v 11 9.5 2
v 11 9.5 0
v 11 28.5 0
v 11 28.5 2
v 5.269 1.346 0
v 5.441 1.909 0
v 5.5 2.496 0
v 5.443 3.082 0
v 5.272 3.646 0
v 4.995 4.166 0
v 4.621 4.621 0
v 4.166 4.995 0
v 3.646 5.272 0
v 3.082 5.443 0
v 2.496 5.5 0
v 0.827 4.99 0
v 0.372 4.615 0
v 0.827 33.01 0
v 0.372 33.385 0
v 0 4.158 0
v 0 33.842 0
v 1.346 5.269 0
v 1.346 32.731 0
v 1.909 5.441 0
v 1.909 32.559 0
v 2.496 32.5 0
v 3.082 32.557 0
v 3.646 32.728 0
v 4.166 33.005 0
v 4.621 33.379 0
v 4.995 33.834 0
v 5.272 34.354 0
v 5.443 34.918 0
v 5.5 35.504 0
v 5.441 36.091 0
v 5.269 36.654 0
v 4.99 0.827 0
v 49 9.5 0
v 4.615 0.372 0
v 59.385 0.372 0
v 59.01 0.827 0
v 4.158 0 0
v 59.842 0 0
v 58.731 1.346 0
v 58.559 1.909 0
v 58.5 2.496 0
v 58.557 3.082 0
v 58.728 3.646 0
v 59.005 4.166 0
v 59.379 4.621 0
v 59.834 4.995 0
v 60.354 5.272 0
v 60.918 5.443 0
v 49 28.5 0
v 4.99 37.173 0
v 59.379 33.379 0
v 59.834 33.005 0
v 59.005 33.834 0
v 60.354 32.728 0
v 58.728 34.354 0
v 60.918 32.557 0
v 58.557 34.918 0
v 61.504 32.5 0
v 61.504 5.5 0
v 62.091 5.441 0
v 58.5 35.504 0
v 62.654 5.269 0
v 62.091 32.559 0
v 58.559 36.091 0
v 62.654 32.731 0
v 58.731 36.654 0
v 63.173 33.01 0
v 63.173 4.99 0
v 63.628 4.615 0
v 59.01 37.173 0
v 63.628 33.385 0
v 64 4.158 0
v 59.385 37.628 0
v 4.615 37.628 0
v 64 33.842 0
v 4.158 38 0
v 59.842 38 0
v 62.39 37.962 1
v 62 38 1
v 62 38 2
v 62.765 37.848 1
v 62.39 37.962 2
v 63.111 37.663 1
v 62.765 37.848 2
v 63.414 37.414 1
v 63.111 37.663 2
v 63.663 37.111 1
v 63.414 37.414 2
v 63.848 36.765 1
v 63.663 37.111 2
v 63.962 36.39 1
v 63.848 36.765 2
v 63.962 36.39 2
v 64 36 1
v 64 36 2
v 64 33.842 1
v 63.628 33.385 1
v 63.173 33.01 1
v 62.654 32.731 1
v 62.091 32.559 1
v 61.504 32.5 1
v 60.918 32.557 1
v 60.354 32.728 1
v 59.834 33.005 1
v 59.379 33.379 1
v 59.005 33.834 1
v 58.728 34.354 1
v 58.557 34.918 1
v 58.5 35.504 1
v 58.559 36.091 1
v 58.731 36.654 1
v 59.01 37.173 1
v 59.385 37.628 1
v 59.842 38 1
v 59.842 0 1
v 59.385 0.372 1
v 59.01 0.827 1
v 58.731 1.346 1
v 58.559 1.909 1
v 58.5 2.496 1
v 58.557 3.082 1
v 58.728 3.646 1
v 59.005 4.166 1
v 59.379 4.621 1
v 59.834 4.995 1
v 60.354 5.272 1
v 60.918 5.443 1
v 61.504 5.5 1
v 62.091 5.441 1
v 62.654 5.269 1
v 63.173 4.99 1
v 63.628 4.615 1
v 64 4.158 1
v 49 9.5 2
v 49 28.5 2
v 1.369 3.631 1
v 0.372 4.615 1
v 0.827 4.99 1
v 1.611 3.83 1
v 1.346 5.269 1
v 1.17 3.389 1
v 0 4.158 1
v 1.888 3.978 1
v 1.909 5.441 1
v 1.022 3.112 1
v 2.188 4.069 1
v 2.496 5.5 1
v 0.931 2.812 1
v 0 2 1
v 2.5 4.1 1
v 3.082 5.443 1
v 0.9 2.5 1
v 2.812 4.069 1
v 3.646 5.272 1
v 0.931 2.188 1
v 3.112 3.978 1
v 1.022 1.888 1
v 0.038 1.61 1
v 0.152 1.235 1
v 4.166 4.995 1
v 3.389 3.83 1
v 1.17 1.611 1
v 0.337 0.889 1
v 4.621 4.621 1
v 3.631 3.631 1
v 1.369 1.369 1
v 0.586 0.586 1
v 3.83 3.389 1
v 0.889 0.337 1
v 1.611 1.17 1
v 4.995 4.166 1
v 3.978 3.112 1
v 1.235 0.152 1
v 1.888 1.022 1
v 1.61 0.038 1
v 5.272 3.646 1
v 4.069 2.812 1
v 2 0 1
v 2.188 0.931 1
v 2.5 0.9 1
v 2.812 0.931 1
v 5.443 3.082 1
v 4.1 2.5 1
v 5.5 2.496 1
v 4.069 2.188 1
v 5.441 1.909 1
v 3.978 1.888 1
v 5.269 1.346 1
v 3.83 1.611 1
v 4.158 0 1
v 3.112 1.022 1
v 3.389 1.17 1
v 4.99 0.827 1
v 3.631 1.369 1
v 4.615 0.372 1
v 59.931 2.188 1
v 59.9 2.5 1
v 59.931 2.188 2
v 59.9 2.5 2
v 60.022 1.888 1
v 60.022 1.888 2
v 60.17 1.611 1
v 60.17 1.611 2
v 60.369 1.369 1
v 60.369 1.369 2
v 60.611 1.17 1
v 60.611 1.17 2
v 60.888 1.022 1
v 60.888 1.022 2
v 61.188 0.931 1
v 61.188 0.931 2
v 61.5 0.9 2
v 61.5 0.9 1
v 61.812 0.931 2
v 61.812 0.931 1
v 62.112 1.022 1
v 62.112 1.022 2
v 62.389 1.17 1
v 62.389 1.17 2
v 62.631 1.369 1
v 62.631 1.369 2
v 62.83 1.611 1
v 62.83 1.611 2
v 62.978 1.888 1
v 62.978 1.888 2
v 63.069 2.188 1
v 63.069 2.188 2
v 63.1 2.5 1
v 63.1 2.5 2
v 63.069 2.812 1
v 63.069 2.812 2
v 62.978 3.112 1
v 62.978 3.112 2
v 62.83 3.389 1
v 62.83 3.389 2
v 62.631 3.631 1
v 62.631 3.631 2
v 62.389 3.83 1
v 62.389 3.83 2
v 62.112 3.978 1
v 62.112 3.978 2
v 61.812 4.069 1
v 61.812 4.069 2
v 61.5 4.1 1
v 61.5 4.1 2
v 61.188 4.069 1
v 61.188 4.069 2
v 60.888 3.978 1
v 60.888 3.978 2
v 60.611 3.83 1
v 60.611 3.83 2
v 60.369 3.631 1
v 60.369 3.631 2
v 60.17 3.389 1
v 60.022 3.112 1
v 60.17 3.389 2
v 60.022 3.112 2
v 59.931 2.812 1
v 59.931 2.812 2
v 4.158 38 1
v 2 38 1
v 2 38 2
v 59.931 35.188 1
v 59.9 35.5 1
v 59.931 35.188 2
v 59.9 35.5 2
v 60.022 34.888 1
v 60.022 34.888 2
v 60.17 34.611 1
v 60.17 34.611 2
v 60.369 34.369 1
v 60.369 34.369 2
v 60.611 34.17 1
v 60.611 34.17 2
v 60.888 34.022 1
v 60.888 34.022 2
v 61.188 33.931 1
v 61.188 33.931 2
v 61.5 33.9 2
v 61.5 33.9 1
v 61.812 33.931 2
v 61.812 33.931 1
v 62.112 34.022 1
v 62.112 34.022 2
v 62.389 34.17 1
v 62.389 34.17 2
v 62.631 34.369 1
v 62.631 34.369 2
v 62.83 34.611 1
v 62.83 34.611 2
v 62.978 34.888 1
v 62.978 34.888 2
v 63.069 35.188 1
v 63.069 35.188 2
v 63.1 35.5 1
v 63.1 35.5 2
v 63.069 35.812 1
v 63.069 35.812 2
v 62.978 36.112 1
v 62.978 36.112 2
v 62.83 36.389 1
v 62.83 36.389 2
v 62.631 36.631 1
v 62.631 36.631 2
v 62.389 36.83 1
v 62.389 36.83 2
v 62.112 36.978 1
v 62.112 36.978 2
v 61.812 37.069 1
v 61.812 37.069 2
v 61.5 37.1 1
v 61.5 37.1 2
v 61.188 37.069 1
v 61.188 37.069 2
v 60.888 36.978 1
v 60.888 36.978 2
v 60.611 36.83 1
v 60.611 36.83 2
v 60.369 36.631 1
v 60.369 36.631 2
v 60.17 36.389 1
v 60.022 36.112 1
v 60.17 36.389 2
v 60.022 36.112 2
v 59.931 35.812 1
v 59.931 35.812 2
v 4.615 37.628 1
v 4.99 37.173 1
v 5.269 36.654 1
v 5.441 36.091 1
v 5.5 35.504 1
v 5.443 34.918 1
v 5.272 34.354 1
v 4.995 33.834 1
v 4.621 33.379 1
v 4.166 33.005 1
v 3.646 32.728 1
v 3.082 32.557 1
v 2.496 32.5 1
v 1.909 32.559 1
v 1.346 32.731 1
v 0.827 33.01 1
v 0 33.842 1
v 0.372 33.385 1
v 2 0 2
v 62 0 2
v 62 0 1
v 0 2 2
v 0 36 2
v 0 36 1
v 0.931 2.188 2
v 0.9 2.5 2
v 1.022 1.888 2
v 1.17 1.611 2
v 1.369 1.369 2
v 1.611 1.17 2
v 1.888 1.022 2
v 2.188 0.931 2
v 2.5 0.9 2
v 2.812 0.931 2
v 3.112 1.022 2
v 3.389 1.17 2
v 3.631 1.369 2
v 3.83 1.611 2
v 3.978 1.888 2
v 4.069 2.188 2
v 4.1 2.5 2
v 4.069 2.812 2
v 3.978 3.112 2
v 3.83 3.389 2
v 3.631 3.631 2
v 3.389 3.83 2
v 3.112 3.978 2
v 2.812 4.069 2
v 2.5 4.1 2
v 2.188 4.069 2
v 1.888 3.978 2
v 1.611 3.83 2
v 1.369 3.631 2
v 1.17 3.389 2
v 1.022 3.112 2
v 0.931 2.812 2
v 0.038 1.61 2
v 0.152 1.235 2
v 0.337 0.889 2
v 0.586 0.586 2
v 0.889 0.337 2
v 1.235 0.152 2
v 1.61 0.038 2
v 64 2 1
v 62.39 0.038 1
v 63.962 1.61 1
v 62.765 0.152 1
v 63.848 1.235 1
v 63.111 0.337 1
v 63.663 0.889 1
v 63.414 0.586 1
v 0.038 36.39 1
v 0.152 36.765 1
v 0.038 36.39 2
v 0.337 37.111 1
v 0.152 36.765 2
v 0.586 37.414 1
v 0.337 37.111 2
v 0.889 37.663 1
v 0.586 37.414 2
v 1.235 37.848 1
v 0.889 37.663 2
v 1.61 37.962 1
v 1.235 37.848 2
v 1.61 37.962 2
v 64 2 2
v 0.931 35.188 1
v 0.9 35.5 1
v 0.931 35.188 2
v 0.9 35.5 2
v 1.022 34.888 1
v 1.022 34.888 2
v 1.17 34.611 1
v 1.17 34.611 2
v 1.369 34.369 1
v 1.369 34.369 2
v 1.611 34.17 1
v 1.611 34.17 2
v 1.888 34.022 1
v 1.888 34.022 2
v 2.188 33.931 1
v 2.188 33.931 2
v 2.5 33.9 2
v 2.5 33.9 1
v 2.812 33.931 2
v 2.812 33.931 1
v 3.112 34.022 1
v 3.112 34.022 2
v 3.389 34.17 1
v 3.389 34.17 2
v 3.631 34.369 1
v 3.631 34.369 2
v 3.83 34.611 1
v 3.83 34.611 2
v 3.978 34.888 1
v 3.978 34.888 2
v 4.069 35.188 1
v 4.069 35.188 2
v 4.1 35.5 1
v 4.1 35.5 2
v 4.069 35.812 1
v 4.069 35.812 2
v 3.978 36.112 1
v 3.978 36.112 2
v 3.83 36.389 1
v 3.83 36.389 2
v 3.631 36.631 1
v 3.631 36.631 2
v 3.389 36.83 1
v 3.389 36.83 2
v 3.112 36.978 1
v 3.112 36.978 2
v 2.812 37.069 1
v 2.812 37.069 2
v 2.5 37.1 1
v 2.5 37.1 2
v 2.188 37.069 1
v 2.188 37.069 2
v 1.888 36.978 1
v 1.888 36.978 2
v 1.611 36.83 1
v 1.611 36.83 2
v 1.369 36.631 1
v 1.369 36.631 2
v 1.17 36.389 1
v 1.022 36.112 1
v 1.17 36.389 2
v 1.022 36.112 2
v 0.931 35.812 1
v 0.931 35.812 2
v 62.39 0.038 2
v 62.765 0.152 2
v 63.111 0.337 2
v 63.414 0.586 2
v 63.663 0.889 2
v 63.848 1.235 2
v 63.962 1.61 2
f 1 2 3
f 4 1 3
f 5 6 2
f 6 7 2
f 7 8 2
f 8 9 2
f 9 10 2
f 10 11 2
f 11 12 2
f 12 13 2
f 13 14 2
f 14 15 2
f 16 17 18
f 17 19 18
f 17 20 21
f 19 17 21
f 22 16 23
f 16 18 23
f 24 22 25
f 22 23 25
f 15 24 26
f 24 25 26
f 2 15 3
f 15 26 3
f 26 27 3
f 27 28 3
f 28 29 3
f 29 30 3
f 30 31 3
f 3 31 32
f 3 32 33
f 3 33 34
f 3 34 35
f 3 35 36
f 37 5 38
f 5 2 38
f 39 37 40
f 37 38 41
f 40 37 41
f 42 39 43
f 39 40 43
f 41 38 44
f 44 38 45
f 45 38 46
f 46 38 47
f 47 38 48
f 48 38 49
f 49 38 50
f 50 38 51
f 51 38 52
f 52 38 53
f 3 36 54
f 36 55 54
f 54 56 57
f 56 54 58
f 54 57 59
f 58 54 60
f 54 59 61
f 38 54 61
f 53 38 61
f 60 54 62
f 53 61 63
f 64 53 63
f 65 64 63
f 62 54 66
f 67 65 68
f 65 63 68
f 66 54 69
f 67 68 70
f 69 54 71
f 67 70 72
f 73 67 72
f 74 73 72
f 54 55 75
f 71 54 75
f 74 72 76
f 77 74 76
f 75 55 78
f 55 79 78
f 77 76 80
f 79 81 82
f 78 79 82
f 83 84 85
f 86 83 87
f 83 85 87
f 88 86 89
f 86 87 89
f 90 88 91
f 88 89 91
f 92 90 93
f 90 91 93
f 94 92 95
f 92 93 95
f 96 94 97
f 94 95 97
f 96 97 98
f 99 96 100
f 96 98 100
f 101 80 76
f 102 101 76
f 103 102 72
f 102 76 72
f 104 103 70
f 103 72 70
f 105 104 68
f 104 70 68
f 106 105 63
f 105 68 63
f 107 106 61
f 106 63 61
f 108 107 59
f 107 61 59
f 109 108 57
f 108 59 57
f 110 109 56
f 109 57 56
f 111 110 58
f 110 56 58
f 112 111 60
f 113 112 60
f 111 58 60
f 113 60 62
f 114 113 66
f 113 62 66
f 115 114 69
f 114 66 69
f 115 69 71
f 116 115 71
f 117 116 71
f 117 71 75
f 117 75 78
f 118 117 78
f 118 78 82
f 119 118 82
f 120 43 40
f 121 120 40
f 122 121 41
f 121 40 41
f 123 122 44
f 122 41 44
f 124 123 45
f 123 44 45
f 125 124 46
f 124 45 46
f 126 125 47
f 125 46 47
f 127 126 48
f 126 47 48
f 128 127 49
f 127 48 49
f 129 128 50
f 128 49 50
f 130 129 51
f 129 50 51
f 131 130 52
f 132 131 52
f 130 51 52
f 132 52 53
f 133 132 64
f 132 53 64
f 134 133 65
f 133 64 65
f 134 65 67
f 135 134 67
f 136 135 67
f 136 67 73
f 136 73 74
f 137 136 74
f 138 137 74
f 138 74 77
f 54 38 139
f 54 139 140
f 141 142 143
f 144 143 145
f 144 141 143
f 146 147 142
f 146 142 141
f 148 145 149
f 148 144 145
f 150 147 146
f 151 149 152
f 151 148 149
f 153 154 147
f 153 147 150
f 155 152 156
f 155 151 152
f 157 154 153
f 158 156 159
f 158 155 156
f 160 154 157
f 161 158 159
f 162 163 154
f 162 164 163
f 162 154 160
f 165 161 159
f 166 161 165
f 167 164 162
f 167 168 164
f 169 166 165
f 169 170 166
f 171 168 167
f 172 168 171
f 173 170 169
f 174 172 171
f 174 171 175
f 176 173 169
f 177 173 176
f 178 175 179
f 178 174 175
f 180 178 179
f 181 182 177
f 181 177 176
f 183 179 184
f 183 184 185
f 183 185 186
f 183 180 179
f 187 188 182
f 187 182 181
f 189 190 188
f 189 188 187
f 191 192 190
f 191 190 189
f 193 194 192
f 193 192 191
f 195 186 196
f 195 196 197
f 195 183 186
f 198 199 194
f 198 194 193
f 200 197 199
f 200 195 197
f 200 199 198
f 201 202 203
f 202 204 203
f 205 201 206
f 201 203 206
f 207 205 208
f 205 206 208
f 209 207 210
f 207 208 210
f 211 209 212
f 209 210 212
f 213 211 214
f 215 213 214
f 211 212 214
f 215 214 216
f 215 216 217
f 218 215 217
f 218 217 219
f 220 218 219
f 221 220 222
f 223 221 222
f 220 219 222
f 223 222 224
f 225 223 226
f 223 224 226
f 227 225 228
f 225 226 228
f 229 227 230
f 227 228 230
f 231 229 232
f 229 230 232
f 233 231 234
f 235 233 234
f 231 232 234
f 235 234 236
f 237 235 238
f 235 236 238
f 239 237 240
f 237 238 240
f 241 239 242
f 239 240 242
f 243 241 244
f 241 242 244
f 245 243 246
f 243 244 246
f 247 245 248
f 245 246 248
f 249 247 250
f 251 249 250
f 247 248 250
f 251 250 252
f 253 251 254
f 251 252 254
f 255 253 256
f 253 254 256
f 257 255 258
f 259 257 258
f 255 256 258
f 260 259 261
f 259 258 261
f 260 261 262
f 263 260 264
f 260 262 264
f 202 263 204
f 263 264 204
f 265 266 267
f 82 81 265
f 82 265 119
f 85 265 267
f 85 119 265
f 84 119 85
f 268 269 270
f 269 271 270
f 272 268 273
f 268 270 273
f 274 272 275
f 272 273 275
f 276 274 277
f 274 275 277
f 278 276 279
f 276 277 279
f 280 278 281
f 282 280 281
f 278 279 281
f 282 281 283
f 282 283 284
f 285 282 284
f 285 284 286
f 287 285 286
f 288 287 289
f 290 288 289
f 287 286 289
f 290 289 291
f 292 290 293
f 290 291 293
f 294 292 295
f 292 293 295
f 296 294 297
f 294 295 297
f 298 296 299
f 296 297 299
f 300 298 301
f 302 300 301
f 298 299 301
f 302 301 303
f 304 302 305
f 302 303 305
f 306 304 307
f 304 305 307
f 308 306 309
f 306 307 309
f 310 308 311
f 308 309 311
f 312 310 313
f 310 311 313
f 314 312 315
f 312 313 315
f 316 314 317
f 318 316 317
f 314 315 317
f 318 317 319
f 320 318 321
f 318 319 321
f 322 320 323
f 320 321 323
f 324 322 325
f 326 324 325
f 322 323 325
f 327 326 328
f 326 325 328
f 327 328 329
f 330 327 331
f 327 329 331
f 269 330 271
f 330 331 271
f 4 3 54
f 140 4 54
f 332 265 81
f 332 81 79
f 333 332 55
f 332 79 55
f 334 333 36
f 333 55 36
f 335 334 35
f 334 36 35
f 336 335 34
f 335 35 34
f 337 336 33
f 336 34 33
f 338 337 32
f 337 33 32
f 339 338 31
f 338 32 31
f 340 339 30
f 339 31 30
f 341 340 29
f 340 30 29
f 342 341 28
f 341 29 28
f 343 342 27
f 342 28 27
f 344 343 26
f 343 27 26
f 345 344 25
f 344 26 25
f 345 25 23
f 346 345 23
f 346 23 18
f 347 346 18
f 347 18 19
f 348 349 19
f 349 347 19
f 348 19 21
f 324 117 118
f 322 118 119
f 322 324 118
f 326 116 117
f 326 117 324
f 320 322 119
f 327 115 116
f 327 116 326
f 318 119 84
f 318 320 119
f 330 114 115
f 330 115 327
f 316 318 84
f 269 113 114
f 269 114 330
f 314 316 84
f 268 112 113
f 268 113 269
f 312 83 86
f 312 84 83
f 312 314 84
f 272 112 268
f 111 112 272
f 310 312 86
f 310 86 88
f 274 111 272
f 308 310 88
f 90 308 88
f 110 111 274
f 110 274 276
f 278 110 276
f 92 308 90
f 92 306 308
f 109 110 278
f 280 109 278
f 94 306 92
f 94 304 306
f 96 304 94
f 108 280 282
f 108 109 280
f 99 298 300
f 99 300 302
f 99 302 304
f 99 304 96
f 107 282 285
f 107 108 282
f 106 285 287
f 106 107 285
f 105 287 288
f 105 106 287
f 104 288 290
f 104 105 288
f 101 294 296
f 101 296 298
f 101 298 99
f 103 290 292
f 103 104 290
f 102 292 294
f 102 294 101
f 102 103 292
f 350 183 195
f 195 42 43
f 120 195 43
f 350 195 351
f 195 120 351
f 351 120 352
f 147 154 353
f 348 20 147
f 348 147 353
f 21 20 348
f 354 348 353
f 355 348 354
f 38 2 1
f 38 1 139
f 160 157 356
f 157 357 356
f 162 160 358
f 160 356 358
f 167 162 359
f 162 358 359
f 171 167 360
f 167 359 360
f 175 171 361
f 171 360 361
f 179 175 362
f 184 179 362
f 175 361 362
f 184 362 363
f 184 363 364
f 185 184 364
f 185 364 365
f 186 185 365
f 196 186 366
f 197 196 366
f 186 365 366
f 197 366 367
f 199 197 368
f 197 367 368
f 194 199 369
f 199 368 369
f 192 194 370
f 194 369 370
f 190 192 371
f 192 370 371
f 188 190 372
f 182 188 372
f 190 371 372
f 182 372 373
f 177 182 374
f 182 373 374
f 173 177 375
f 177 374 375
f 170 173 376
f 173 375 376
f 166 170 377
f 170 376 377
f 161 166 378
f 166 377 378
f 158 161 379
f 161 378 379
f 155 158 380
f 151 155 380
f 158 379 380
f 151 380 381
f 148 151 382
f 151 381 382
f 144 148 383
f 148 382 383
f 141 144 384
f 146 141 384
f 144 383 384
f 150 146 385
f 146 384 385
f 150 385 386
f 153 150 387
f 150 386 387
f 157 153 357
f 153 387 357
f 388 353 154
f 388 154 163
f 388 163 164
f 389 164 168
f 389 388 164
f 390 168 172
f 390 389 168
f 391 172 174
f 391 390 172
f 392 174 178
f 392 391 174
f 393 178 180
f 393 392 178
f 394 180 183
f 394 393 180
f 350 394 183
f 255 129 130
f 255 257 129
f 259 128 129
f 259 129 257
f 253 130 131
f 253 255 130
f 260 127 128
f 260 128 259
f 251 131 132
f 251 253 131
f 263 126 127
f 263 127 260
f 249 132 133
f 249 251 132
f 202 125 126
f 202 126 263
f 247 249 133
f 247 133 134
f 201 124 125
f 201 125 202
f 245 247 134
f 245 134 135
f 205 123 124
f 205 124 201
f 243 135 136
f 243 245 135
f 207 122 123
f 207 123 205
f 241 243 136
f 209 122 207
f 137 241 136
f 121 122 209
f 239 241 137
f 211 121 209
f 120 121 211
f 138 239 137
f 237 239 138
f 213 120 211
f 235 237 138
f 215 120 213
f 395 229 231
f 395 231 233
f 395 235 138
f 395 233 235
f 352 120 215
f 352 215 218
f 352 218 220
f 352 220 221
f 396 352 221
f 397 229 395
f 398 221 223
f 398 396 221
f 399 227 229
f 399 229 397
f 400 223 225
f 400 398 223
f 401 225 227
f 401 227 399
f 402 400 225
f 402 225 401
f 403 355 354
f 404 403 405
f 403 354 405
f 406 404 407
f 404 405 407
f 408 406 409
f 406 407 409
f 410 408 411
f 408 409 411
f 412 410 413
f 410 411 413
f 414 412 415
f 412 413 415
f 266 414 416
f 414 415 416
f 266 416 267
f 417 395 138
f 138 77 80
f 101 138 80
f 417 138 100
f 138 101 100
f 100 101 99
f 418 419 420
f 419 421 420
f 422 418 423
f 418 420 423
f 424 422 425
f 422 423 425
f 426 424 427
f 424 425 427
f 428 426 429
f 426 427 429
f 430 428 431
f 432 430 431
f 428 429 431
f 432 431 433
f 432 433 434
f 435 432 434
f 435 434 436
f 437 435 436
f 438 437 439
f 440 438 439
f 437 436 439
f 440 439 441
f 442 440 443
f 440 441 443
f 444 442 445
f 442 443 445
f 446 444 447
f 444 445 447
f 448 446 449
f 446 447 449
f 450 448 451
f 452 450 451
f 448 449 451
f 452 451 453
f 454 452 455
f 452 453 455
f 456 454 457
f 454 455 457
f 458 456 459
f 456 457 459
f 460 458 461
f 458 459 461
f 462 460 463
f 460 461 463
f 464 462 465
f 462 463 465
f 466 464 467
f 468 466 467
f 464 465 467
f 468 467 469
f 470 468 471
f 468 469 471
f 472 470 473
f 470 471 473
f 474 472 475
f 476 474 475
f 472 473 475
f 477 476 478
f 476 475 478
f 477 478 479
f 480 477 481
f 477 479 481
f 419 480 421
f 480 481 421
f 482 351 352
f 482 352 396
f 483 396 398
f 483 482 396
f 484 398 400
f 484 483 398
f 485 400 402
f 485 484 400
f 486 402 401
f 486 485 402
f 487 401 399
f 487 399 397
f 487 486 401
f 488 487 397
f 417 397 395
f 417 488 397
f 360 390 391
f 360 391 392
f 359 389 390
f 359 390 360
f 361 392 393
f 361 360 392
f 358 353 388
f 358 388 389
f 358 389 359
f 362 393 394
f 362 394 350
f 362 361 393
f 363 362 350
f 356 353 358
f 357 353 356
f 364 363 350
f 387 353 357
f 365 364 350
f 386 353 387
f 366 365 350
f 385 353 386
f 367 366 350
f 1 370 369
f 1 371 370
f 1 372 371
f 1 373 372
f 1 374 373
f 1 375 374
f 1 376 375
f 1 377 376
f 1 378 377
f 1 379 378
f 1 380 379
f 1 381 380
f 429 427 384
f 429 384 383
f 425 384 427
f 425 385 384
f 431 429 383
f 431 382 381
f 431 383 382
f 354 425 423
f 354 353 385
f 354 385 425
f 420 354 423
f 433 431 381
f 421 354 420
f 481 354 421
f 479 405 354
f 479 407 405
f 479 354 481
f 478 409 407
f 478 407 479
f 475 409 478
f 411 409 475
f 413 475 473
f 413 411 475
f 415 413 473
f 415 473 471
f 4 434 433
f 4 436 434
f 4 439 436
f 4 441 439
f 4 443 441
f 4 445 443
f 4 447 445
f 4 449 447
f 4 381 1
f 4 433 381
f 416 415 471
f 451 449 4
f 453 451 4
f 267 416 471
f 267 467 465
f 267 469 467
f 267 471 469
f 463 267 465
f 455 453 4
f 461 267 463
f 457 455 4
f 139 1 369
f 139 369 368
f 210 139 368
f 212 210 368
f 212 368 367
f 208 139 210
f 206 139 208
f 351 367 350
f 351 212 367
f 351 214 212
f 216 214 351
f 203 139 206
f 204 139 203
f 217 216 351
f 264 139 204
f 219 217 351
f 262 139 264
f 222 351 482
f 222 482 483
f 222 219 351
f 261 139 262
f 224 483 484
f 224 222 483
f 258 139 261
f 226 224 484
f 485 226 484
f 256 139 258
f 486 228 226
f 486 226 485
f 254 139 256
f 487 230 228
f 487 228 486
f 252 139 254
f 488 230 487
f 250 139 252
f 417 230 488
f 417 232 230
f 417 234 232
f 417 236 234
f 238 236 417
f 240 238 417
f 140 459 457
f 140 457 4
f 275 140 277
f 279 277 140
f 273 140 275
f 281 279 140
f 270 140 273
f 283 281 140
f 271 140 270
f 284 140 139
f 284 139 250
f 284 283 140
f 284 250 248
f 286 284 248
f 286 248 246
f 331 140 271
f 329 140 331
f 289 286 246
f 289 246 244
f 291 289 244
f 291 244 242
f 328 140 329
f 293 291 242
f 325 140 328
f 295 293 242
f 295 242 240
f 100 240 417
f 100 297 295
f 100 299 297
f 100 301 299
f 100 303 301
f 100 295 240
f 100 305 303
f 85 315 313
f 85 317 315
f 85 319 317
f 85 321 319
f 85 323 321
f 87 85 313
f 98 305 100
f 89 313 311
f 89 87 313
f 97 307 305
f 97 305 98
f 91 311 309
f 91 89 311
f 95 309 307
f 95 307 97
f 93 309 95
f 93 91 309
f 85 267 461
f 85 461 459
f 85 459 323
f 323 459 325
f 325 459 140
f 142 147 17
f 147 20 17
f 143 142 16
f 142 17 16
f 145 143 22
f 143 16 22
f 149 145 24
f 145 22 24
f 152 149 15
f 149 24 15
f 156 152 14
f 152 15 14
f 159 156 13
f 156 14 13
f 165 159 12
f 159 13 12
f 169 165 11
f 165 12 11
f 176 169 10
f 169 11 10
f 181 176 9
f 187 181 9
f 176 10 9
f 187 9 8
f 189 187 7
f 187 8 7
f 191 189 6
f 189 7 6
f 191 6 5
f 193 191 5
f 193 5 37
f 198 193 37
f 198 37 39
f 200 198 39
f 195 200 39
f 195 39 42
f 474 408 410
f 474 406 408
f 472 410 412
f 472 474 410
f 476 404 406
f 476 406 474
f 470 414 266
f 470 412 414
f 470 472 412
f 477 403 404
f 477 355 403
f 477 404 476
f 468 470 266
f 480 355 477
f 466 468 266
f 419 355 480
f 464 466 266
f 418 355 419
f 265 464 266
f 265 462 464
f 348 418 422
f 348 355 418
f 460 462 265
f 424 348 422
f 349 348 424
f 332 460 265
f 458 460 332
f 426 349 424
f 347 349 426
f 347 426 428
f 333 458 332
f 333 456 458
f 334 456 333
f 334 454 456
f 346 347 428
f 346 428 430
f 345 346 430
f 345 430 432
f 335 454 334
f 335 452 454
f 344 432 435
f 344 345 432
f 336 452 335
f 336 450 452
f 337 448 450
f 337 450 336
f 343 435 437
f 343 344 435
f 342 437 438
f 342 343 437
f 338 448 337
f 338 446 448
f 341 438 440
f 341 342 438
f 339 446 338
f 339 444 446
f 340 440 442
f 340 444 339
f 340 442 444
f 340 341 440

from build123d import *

# Parameters (mm, degrees)
F0_W           = 64
F0_H           = 38
F0_W_2         = 38
F0_H_2         = 19
F1_DEPTH       = 2
F2_R           = 2
F4_D           = 3.2
F4_CBORE_D     = 6
F4_CBORE_DEPTH = 1


with BuildPart() as f1:
    # F0 (on Top) → F1 (new body)
    with BuildSketch(Plane.XY):
        with Locations((32, 19)):
            Rectangle(F0_W, F0_H)
        with Locations((30, 19)):
            Rectangle(F0_W_2, F0_H_2, mode=Mode.SUBTRACT)
    extrude(amount=F1_DEPTH)

    # F2
    f2_edges = [f1.edges().sort_by_distance(p)[0] for p in [
        (0, 38, 1),
        (0, 0, 1),
        (64, 0, 1),
        (64, 38, 1),
    ]]
    fillet(f2_edges, radius=F2_R)

    # F4 (through all)
    with Locations(Plane(origin=(0, 0, 0), x_dir=(1, 0, 0), z_dir=(0, 0, -1))):
        with Locations((2.5, -2.5), (2.5, -35.5), (61.5, -35.5), (61.5, -2.5)):
            CounterBoreHole(F4_D / 2, F4_CBORE_D / 2, F4_CBORE_DEPTH)


solid = f1.part
